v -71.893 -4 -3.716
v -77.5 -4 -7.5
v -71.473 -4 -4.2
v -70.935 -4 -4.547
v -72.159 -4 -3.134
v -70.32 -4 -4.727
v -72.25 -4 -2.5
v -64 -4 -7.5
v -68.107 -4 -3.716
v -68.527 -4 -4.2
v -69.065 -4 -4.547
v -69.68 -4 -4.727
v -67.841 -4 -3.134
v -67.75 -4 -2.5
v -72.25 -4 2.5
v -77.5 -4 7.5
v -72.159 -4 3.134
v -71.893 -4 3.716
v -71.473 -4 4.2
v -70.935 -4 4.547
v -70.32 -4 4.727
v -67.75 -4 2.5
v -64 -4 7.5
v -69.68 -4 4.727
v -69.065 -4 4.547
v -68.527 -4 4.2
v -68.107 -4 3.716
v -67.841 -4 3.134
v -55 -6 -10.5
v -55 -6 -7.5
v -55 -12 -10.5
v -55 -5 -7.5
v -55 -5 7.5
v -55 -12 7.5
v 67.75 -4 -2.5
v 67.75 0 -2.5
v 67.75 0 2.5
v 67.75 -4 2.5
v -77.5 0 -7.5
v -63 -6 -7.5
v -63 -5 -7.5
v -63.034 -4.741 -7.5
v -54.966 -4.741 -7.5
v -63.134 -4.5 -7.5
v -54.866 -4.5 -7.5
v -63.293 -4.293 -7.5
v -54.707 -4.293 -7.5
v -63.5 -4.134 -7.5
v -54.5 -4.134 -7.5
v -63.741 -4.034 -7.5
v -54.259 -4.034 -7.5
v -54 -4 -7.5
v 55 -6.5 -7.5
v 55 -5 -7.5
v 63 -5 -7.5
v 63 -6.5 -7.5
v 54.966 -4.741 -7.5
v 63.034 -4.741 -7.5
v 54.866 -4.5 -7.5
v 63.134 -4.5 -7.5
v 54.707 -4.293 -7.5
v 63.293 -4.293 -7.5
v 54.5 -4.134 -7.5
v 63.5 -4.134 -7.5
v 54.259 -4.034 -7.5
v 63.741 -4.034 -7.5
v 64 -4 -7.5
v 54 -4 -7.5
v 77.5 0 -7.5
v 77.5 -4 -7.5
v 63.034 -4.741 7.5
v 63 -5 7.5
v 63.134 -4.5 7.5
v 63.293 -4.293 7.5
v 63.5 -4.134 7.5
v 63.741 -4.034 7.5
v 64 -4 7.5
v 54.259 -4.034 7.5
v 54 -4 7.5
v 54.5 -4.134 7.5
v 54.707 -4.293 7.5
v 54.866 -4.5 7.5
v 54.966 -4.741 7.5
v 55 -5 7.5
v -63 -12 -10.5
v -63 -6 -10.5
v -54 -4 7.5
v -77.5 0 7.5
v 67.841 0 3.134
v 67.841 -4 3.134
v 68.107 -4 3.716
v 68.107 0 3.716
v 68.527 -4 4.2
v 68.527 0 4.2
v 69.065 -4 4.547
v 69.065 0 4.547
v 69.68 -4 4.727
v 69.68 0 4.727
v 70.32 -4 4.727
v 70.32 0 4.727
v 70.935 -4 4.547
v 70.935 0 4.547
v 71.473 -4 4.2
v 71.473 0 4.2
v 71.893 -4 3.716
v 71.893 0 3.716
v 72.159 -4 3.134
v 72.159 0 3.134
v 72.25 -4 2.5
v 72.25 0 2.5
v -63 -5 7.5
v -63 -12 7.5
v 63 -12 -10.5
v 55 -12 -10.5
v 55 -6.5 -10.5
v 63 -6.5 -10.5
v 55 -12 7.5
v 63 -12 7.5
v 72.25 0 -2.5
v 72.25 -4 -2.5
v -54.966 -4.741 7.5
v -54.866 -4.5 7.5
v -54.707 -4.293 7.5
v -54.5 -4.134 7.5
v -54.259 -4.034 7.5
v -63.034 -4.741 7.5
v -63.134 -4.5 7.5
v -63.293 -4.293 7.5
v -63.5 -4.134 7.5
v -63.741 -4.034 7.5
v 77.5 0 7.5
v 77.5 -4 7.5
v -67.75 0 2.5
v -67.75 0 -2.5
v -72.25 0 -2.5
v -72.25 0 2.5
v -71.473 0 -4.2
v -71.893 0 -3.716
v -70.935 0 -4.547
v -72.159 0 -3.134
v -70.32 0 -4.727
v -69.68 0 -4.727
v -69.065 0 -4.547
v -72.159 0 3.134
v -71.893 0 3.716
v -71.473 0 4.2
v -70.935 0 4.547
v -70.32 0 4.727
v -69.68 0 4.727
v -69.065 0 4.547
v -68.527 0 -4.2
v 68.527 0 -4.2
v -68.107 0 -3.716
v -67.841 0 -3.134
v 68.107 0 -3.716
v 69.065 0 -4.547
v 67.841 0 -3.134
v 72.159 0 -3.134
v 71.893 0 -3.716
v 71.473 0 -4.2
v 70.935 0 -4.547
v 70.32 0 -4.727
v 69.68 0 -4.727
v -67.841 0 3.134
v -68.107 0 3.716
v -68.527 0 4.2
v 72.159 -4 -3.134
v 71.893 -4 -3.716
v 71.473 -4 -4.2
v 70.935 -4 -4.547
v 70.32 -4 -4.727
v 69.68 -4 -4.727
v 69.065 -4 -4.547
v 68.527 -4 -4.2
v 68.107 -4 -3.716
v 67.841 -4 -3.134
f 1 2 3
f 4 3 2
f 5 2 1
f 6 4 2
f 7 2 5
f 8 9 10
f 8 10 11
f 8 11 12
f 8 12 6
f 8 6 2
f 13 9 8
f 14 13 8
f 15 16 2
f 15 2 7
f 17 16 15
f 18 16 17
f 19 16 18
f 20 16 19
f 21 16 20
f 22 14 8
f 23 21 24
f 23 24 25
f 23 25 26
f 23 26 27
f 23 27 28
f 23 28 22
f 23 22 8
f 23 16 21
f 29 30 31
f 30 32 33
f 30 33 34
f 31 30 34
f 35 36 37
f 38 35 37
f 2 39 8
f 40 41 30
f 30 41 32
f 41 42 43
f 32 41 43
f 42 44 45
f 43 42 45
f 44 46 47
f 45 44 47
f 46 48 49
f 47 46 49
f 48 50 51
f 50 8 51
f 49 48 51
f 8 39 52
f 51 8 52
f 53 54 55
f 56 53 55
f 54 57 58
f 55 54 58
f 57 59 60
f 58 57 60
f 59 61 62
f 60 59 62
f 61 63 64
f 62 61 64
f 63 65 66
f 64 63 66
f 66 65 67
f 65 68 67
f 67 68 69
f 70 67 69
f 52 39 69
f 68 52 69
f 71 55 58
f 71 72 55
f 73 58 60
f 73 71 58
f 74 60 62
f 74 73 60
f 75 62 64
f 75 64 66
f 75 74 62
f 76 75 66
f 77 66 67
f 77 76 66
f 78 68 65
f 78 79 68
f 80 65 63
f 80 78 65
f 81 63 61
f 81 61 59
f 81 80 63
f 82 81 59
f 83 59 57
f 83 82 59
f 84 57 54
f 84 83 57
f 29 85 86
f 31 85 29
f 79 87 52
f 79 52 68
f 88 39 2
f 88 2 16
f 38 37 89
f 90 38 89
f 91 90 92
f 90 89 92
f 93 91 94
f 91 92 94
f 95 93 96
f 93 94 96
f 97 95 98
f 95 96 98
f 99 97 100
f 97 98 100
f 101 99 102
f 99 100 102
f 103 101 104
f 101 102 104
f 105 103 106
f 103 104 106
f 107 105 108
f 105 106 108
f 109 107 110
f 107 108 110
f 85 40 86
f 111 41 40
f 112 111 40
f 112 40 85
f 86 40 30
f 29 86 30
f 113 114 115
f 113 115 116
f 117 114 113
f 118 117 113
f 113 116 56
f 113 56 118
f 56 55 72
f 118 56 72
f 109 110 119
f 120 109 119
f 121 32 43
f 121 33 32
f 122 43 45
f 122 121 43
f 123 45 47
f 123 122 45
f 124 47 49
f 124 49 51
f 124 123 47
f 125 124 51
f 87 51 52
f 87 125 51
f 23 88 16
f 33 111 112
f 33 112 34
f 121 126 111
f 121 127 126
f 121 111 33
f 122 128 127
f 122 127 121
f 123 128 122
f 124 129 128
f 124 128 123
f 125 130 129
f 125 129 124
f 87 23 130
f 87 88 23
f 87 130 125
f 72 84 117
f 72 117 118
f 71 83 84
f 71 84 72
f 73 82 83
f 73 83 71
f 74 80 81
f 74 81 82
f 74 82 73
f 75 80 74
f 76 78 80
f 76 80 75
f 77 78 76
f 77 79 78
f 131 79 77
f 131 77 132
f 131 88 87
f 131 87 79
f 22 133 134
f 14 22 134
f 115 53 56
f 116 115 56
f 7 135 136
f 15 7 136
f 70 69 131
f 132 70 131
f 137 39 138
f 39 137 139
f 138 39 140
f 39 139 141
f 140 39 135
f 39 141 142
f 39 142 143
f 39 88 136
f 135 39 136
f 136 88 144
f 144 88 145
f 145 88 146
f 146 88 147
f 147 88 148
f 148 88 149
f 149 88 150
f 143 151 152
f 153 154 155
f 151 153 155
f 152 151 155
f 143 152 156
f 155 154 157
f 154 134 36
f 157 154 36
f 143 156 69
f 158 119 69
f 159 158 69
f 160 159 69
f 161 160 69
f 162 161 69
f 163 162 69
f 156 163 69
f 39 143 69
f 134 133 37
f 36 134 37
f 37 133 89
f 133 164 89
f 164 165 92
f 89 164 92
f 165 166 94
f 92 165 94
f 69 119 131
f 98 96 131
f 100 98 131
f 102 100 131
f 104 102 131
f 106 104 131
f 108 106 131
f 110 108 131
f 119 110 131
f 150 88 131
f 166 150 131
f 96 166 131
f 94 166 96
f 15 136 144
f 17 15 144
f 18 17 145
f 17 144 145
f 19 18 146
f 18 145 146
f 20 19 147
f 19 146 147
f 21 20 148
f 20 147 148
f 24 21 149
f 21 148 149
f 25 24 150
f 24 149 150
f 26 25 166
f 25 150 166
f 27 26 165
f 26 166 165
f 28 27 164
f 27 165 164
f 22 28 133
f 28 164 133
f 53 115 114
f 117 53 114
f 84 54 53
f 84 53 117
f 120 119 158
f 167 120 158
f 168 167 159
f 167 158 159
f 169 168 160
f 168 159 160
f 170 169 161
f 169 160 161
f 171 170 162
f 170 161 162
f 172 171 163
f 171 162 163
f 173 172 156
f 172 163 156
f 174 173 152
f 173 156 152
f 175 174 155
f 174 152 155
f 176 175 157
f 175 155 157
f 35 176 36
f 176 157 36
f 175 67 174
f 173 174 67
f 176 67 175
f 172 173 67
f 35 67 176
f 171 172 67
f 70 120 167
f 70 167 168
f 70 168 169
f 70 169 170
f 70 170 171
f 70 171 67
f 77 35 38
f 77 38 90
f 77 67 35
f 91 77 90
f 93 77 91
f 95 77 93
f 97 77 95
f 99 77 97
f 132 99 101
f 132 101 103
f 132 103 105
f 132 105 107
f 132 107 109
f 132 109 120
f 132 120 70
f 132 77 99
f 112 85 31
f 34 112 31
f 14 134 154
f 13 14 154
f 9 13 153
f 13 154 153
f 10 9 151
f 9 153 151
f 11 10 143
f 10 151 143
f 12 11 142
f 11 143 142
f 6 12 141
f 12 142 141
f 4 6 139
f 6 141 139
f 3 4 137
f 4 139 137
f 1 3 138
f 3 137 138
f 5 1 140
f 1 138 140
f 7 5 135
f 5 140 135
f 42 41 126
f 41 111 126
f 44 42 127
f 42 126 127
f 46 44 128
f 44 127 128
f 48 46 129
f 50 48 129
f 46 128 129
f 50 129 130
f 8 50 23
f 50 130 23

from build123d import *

# Parameters (mm, degrees)
F0_W     = 155
F0_H     = 15
F1_DEPTH = 4
F2_W     = 8
F2_H     = 15
F3_DEPTH = 8
F4_W     = 8
F4_H     = 6
F4_H_2   = 5.5
F5_DEPTH = 3
F6_R     = 1


# Not quite as in the source:
# - a feature names something its author has since deleted; it is built from what else it names


with BuildPart() as f1:
    # F0 (on Front) → F1 (new body)
    with BuildSketch(Plane.XZ):
        Rectangle(F0_W, F0_H)
        with BuildLine():
            Line((-72.25, -2.5), (-72.25, 2.5))
            ThreePointArc((-72.25, 2.5), (-70, 4.75), (-67.75, 2.5))
            Line((-67.75, 2.5), (-67.75, -2.5))
            ThreePointArc((-67.75, -2.5), (-70, -4.75), (-72.25, -2.5))
        make_face(mode=Mode.SUBTRACT)
        with BuildLine():
            ThreePointArc((67.75, 2.5), (70, 4.75), (72.25, 2.5))
            Line((72.25, 2.5), (72.25, -2.5))
            ThreePointArc((72.25, -2.5), (70, -4.75), (67.75, -2.5))
            Line((67.75, -2.5), (67.75, 2.5))
        make_face(mode=Mode.SUBTRACT)
    extrude(amount=F1_DEPTH)

    # F2 (on face) → F3 (join)
    with BuildSketch(Plane.XZ.offset(4)):
        with Locations((-59, 0)):
            Rectangle(F2_W, F2_H)
        with Locations((59, 0)):
            Rectangle(F2_W, F2_H)
    extrude(amount=F3_DEPTH)

    # F4 (on face) → F5 (join)
    with BuildSketch(Plane(origin=(0, 0, -7.5), x_dir=(1, 0, 0), z_dir=(0, 0, -1))):
        with Locations((-59, 9)):
            Rectangle(F4_W, F4_H)
        with Locations((59, 9.25)):
            Rectangle(F4_W, F4_H_2)
    extrude(amount=F5_DEPTH)

    # F6
    f6_edges = [f1.edges().sort_by_distance(p)[0] for p in [
        (55, -4, 0),
        (-55, -4, 0),
        (63, -4, 0),
        (-63, -4, 0),
    ]]
    fillet(f6_edges, radius=F6_R)


solid = f1.part
